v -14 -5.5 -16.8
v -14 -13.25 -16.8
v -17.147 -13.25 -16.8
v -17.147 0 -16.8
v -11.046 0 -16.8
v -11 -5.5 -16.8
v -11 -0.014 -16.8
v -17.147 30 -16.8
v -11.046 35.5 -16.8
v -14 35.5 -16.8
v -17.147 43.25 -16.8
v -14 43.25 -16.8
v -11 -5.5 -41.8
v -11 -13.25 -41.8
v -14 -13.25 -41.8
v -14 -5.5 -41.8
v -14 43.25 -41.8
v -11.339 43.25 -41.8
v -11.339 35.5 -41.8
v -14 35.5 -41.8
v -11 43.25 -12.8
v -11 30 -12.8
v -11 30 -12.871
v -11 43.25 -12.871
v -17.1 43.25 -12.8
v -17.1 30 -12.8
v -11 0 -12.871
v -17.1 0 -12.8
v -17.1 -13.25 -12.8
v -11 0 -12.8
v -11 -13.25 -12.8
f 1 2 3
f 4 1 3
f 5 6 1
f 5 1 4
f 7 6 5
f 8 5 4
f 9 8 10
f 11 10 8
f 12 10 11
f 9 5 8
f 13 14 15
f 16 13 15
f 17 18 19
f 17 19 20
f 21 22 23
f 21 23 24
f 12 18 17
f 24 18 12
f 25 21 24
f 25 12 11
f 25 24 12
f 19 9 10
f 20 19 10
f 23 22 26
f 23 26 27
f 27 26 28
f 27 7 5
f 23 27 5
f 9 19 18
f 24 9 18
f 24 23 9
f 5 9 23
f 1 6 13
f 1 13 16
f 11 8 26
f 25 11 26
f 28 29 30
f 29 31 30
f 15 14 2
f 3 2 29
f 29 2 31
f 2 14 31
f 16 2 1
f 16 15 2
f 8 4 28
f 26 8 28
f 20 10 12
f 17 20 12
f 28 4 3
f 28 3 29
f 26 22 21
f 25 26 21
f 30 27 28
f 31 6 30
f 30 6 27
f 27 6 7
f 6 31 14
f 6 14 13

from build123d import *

# Parameters (mm, degrees)
BOSS_EXTRUDE1_DEPTH      = 30
SKETCH3_R                = 4
CUT_EXTRUDE1_DEPTH       = 40
SKETCH4_W                = 3
SKETCH4_H                = 41
BOSS_EXTRUDE2_DEPTH      = 4
BOSS_EXTRUDE3_DEPTH      = 25
BOSS_EXTRUDE3_DEPTH_BACK = 4
SKETCH5_W                = 3
SKETCH5_H                = 7.75
BOSS_EXTRUDE4_REACH      = 69.734
SKETCH6_W                = 4
SKETCH6_H                = 56.5
CUT_EXTRUDE3_DEPTH       = 47
CUT_EXTRUDE4_DEPTH       = 47


with BuildPart() as part:
    # Sketch1 → Boss-Extrude1 (new body)
    with BuildSketch(Plane(origin=(0, 0, 0), x_dir=(1, 0, 0), z_dir=(0, 1, 0))):
        Polygon((-12.8, -12.8), (-13.1, 12.8), (13.1, 12.8), (12.8, -12.6), (16.799721029, -12.6472408), (17.147523085, 16.8), (-17.147149649, 16.8), (-16.79972537, -12.846871782), align=None)
    extrude(amount=BOSS_EXTRUDE1_DEPTH)

    # Sketch3 → Cut-Extrude1 (cut)
    with BuildSketch(Plane(origin=(16.946733814, 0, 0.200158273), x_dir=(0.011810199887684227, 0, -0.9999302571572745), z_dir=(0.9999302571572745, 0, 0.011810199887684227))):
        with Locations(Location((-0.747950682, 15, 0), (0, 0, 180))):
            Circle(SKETCH3_R)
    extrude(amount=-CUT_EXTRUDE1_DEPTH, mode=Mode.SUBTRACT)

    # Sketch4 → Boss-Extrude2 (add)
    with BuildSketch(Plane(origin=(0, 0, -16.8), x_dir=(-1, 0, 0), z_dir=(0, 0, -1))):
        with Locations((12.499813282, 15)):
            Rectangle(SKETCH4_W, SKETCH4_H)
    extrude(amount=-BOSS_EXTRUDE2_DEPTH)

    # Sketch5 → Boss-Extrude3 (add, two sides: drawn at the far end of the back side and taken through both)
    with BuildSketch(Plane(origin=(0, 0, -16.8), x_dir=(-1, 0, 0), z_dir=(0, 0, -1)).offset(-BOSS_EXTRUDE3_DEPTH_BACK)):
        with Locations((12.499813282, 39.375)):
            Rectangle(SKETCH5_W, SKETCH5_H)
        with Locations((12.499813282, -9.375)):
            Rectangle(SKETCH5_W, SKETCH5_H)
    extrude(amount=BOSS_EXTRUDE3_DEPTH + BOSS_EXTRUDE3_DEPTH_BACK)

    # Boss-Extrude4: up to this plane
    boss_extrude4_end = Plane(origin=(-16.79972537, 30, 12.846871782), z_dir=(0.9999313425206403, 0, -0.01171794542016394))
    # Sketch6 → Boss-Extrude4 (add, up to the surface)
    with BuildSketch(Plane.ZY.offset(13.999813282), mode=Mode.PRIVATE) as boss_extrude4_sk1:
        with Locations((-14.8, 15)):
            Rectangle(SKETCH6_W, SKETCH6_H)
    boss_extrude4_tool1 = split(extrude(boss_extrude4_sk1.sketch, amount=BOSS_EXTRUDE4_REACH, mode=Mode.PRIVATE), bisect_by=boss_extrude4_end, keep=Keep.BOTH, mode=Mode.PRIVATE)
    add(boss_extrude4_tool1.solids().sort_by_distance((-13.999813, 15, -14.8))[0])

    # Sketch7 → Cut-Extrude3 (cut)
    with BuildSketch(Plane(origin=(-16.947947202, 0, 0.198608756), x_dir=(0.01171794542016394, 0, 0.9999313425206403), z_dir=(-0.9999313425206403, 0, 0.01171794542016394))):
        Polygon((15.81172836, 30), (-12.999501269, 30), (-12.999501269, 0), (19.011921217, 0), align=None)
    extrude(amount=-CUT_EXTRUDE3_DEPTH, mode=Mode.SUBTRACT)

    # Sketch8 → Cut-Extrude4 (cut)
    with BuildSketch(Plane(origin=(-0.152327446, 0, -12.998608756), x_dir=(0.9999313425206403, 0, -0.011717945420163944), z_dir=(0.011717945420163944, 0, 0.9999313425206403))):
        Polygon((-10.848230648, 0), (-10.848230648, 46.508852654), (34.891429073, 42.782410239), (32.959466486, 0), (23.967074224, -10.626450369), align=None)
    extrude(amount=-CUT_EXTRUDE4_DEPTH, mode=Mode.SUBTRACT)


solid = part.part
